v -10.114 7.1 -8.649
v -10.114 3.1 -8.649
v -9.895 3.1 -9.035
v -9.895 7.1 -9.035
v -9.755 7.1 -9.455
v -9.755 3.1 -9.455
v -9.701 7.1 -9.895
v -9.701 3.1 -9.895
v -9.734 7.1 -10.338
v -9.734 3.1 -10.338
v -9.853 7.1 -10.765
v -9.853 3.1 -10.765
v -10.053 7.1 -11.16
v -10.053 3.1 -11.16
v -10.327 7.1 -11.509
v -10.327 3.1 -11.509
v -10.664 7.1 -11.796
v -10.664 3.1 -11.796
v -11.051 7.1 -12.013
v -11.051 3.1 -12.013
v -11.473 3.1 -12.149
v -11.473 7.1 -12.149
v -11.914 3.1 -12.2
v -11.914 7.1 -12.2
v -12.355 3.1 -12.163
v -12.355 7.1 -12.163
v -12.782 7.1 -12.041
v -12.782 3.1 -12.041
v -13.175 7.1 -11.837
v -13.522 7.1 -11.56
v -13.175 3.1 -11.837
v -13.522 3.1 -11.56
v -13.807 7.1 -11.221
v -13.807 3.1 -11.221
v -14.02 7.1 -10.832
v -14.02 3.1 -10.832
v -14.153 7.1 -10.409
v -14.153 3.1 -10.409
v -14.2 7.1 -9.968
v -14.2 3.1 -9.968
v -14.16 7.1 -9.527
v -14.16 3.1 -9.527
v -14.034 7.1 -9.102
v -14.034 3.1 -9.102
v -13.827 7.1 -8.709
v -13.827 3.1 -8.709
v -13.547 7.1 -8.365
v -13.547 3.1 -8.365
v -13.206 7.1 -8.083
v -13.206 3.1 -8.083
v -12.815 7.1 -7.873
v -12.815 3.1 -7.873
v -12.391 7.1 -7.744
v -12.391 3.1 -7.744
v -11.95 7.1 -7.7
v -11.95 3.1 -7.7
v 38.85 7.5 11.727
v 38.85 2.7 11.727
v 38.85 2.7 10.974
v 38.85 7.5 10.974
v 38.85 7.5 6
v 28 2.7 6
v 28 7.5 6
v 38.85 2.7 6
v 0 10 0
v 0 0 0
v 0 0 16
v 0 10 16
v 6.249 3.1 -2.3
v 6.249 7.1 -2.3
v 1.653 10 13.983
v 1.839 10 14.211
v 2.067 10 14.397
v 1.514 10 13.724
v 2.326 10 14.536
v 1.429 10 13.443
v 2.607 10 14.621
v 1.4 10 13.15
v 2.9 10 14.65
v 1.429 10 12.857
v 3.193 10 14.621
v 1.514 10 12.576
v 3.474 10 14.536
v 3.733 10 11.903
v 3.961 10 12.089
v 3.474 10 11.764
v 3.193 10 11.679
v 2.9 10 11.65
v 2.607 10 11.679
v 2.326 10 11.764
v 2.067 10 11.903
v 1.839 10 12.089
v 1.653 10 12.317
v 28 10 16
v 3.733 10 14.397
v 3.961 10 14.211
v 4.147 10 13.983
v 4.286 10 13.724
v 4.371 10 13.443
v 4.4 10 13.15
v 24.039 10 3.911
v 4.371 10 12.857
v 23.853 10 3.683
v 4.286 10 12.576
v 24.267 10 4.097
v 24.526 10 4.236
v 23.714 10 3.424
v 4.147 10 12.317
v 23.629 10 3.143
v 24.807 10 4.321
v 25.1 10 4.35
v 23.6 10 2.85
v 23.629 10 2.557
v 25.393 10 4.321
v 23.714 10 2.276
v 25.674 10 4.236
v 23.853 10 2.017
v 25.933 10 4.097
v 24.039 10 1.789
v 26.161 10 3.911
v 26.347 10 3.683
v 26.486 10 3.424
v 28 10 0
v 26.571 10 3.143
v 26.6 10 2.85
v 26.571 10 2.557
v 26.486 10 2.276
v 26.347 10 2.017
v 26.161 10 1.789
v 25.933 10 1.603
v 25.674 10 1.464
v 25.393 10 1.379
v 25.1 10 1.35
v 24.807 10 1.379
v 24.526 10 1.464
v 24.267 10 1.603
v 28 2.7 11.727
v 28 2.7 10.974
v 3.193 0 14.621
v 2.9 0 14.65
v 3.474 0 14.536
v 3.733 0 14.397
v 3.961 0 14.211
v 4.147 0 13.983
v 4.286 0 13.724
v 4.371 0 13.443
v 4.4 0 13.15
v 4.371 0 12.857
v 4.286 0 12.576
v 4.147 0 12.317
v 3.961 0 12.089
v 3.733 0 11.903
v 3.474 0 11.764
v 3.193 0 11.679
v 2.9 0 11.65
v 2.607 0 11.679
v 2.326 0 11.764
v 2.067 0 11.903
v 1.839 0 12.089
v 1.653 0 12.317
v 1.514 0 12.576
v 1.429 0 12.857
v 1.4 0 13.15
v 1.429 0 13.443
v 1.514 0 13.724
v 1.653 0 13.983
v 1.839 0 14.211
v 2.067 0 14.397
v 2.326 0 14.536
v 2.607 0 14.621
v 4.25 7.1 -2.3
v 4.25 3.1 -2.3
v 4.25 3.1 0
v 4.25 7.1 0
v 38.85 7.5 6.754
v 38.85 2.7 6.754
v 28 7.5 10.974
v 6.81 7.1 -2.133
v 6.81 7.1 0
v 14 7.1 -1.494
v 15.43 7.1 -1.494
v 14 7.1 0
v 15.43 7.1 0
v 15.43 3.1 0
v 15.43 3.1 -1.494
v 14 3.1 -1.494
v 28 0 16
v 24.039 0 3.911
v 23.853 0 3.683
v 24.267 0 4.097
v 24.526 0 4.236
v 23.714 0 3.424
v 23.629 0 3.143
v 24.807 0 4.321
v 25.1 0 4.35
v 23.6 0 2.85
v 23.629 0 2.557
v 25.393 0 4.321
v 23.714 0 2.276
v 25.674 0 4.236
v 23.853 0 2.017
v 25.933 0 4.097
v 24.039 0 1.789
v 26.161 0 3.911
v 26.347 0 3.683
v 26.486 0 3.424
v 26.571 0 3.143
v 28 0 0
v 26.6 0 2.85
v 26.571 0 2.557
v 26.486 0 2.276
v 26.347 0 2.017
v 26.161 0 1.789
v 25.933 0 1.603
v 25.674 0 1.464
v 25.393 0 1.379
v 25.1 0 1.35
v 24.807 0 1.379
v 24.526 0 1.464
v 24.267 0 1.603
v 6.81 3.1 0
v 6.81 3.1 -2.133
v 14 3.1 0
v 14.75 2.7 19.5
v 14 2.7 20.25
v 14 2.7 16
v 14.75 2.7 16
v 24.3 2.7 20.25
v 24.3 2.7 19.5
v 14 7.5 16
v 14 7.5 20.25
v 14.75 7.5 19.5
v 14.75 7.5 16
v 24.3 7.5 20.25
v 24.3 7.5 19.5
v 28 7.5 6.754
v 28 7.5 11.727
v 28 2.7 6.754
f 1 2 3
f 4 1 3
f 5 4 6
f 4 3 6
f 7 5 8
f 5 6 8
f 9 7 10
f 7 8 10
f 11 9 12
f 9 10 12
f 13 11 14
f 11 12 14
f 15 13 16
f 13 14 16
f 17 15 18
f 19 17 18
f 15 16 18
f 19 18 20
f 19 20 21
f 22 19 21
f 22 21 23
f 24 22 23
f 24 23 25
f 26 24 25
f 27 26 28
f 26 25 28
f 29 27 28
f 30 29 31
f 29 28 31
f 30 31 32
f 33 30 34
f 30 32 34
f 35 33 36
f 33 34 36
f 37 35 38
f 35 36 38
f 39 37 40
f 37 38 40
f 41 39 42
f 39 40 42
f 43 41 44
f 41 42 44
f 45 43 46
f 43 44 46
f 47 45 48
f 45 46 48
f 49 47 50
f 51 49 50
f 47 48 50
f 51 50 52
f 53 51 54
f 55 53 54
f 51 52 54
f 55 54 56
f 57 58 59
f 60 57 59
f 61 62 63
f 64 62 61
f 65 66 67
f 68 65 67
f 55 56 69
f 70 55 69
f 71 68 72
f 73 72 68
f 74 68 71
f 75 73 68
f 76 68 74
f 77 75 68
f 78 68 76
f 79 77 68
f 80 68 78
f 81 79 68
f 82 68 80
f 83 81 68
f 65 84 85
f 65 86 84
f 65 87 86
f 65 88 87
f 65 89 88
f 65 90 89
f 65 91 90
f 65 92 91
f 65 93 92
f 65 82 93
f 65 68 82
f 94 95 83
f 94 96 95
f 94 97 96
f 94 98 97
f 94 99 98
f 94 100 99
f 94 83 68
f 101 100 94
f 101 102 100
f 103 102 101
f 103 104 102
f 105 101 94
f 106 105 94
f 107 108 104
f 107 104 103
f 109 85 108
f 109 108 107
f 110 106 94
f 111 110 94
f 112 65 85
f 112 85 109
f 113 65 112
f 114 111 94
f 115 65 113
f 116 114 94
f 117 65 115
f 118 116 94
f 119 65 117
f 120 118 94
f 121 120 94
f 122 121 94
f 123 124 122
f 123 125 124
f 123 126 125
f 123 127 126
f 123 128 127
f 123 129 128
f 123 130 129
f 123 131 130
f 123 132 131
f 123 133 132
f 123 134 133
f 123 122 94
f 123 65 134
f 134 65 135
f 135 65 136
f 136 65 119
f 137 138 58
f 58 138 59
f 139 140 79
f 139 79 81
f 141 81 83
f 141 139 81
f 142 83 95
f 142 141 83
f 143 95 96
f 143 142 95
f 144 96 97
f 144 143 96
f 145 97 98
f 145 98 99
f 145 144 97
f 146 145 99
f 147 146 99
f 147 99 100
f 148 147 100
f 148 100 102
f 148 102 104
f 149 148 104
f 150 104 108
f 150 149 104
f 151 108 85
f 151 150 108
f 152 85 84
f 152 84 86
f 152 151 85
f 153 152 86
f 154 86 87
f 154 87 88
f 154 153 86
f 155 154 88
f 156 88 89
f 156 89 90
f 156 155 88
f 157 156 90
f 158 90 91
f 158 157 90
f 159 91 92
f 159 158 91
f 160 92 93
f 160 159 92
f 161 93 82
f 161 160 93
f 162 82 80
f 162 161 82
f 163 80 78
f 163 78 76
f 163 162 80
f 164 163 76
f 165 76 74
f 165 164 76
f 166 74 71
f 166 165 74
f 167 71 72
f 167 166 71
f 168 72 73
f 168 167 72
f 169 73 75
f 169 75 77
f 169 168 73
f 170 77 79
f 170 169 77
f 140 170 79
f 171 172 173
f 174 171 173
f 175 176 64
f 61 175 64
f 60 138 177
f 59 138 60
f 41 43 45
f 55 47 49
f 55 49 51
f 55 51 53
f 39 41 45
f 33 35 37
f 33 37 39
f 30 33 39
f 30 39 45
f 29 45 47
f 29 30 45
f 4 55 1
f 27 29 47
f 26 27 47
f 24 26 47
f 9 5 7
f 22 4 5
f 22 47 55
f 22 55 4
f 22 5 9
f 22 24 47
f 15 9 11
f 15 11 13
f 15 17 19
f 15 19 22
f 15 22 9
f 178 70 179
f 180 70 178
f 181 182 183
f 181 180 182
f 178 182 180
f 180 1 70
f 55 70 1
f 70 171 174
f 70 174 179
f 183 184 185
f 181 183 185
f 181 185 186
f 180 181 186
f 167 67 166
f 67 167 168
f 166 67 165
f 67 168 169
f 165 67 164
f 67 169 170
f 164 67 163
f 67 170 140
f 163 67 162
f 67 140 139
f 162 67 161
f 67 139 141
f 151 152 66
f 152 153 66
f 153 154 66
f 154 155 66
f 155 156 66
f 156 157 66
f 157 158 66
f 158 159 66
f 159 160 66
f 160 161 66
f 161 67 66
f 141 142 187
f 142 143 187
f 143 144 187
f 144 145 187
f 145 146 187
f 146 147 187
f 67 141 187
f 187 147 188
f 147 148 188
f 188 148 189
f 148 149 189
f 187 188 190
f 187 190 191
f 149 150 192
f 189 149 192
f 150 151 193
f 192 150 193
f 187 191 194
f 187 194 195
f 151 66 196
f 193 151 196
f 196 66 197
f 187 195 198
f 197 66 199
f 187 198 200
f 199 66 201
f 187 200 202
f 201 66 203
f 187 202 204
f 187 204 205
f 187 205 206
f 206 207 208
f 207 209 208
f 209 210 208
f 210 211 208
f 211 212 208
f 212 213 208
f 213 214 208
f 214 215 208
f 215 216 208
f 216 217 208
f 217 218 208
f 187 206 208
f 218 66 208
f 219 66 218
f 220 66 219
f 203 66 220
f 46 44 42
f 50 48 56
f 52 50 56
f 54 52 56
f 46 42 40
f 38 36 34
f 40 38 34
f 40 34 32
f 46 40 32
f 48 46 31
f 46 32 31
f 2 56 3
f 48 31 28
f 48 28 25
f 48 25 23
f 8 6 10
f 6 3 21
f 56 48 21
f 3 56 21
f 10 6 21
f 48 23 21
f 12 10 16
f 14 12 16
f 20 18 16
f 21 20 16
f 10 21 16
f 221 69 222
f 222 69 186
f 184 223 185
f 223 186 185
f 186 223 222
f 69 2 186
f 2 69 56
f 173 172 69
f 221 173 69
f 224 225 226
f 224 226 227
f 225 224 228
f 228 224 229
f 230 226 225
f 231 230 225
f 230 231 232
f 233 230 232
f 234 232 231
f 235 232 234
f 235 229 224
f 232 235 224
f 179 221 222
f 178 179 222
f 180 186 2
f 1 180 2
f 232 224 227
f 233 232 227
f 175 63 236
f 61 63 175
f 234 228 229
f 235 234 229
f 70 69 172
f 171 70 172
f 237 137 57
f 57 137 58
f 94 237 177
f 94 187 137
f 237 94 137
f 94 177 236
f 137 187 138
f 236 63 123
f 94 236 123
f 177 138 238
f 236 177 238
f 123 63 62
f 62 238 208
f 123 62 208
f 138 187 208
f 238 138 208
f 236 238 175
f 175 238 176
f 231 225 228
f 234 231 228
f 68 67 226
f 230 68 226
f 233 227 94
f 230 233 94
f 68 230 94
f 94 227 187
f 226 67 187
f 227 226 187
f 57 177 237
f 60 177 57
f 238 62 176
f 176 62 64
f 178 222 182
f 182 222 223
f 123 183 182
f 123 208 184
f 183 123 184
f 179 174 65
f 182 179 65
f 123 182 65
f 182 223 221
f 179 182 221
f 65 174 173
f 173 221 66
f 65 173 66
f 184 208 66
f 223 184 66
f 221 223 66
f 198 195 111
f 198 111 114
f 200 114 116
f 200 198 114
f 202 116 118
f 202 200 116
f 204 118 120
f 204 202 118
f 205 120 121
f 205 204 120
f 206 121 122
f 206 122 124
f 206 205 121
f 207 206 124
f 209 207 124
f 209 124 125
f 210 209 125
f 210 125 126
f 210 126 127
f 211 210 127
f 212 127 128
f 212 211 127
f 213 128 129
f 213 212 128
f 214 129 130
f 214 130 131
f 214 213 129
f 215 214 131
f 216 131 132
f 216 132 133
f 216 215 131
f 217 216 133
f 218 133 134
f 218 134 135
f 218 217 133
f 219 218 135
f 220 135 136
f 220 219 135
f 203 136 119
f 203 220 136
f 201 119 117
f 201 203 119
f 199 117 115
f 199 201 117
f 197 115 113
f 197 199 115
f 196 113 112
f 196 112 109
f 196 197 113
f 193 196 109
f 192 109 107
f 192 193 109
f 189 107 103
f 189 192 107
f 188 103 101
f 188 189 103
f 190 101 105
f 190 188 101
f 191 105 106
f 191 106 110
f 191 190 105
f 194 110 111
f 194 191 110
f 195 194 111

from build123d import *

# Parameters (mm, degrees)
SKETCH1_R           = 1.5
BOSS_EXTRUDE1_DEPTH = 10
BOSS_EXTRUDE2_START = 3.1
BOSS_EXTRUDE2_DEPTH = 4
BOSS_EXTRUDE3_START = 2.7
SKETCH1_4_W         = 10.85
SKETCH1_4_H         = 0.753741083
BOSS_EXTRUDE3_DEPTH = 4.8


with BuildPart() as part:
    # Sketch1 → Boss-Extrude1 (new body)
    with BuildSketch(Plane(origin=(0, 0, 0), x_dir=(1, 0, 0), z_dir=(0, 1, 0))):
        Polygon((15.43, 0), (14, 0), (6.81, 0), (4.25, 0), (0, 0), (0, -16), (14, -16), (14.75, -16), (28, -16), (28, -11.727482166), (28, -10.973741083), (28, -6.753741083), (28, -6), (28, 0), align=None)
        with Locations((2.9, -13.15)):
            Circle(SKETCH1_R, mode=Mode.SUBTRACT)
        with Locations((25.1, -2.85)):
            Circle(SKETCH1_R, mode=Mode.SUBTRACT)
    extrude(amount=BOSS_EXTRUDE1_DEPTH)

    # Sketch1<3> → Boss-Extrude2 (add)
    with BuildSketch(Plane(origin=(0, 0, 0), x_dir=(1, 0, 0), z_dir=(0, 1, 0)).offset(BOSS_EXTRUDE2_START)):
        with BuildLine():
            Line((6.81, 2.13344894), (14, 0))
            Line((14, 0), (15.43, 0))
            Line((15.43, 0), (15.43, 1.494165498))
            Line((15.43, 1.494165498), (14, 1.494165498))
            Line((14, 1.494165498), (-10.114002255, 8.64938004))
            ThreePointArc((-10.114002255, 8.64938004), (-12.983466277, 11.948611382), (-11.95, 7.7))
            Line((-11.95, 7.7), (6.248701299, 2.3))
            Line((6.248701299, 2.3), (4.25, 2.3))
            Line((4.25, 2.3), (4.25, 0))
            Line((4.25, 0), (6.81, 0))
            Line((6.81, 0), (6.81, 2.13344894))
        make_face()
    extrude(amount=BOSS_EXTRUDE2_DEPTH)

    # Sketch1<4> → Boss-Extrude3 (add)
    with BuildSketch(Plane(origin=(0, 0, 0), x_dir=(1, 0, 0), z_dir=(0, 1, 0)).offset(BOSS_EXTRUDE3_START)):
        with Locations((33.425, -6.376870542)):
            Rectangle(SKETCH1_4_W, SKETCH1_4_H)
        with Locations((33.425, -11.350611625)):
            Rectangle(SKETCH1_4_W, SKETCH1_4_H)
        Polygon((14.75, -16), (14, -16), (14, -20.25), (24.3, -20.25), (24.3, -19.5), (14.75, -19.5), align=None)
    extrude(amount=BOSS_EXTRUDE3_DEPTH)


solid = part.part
